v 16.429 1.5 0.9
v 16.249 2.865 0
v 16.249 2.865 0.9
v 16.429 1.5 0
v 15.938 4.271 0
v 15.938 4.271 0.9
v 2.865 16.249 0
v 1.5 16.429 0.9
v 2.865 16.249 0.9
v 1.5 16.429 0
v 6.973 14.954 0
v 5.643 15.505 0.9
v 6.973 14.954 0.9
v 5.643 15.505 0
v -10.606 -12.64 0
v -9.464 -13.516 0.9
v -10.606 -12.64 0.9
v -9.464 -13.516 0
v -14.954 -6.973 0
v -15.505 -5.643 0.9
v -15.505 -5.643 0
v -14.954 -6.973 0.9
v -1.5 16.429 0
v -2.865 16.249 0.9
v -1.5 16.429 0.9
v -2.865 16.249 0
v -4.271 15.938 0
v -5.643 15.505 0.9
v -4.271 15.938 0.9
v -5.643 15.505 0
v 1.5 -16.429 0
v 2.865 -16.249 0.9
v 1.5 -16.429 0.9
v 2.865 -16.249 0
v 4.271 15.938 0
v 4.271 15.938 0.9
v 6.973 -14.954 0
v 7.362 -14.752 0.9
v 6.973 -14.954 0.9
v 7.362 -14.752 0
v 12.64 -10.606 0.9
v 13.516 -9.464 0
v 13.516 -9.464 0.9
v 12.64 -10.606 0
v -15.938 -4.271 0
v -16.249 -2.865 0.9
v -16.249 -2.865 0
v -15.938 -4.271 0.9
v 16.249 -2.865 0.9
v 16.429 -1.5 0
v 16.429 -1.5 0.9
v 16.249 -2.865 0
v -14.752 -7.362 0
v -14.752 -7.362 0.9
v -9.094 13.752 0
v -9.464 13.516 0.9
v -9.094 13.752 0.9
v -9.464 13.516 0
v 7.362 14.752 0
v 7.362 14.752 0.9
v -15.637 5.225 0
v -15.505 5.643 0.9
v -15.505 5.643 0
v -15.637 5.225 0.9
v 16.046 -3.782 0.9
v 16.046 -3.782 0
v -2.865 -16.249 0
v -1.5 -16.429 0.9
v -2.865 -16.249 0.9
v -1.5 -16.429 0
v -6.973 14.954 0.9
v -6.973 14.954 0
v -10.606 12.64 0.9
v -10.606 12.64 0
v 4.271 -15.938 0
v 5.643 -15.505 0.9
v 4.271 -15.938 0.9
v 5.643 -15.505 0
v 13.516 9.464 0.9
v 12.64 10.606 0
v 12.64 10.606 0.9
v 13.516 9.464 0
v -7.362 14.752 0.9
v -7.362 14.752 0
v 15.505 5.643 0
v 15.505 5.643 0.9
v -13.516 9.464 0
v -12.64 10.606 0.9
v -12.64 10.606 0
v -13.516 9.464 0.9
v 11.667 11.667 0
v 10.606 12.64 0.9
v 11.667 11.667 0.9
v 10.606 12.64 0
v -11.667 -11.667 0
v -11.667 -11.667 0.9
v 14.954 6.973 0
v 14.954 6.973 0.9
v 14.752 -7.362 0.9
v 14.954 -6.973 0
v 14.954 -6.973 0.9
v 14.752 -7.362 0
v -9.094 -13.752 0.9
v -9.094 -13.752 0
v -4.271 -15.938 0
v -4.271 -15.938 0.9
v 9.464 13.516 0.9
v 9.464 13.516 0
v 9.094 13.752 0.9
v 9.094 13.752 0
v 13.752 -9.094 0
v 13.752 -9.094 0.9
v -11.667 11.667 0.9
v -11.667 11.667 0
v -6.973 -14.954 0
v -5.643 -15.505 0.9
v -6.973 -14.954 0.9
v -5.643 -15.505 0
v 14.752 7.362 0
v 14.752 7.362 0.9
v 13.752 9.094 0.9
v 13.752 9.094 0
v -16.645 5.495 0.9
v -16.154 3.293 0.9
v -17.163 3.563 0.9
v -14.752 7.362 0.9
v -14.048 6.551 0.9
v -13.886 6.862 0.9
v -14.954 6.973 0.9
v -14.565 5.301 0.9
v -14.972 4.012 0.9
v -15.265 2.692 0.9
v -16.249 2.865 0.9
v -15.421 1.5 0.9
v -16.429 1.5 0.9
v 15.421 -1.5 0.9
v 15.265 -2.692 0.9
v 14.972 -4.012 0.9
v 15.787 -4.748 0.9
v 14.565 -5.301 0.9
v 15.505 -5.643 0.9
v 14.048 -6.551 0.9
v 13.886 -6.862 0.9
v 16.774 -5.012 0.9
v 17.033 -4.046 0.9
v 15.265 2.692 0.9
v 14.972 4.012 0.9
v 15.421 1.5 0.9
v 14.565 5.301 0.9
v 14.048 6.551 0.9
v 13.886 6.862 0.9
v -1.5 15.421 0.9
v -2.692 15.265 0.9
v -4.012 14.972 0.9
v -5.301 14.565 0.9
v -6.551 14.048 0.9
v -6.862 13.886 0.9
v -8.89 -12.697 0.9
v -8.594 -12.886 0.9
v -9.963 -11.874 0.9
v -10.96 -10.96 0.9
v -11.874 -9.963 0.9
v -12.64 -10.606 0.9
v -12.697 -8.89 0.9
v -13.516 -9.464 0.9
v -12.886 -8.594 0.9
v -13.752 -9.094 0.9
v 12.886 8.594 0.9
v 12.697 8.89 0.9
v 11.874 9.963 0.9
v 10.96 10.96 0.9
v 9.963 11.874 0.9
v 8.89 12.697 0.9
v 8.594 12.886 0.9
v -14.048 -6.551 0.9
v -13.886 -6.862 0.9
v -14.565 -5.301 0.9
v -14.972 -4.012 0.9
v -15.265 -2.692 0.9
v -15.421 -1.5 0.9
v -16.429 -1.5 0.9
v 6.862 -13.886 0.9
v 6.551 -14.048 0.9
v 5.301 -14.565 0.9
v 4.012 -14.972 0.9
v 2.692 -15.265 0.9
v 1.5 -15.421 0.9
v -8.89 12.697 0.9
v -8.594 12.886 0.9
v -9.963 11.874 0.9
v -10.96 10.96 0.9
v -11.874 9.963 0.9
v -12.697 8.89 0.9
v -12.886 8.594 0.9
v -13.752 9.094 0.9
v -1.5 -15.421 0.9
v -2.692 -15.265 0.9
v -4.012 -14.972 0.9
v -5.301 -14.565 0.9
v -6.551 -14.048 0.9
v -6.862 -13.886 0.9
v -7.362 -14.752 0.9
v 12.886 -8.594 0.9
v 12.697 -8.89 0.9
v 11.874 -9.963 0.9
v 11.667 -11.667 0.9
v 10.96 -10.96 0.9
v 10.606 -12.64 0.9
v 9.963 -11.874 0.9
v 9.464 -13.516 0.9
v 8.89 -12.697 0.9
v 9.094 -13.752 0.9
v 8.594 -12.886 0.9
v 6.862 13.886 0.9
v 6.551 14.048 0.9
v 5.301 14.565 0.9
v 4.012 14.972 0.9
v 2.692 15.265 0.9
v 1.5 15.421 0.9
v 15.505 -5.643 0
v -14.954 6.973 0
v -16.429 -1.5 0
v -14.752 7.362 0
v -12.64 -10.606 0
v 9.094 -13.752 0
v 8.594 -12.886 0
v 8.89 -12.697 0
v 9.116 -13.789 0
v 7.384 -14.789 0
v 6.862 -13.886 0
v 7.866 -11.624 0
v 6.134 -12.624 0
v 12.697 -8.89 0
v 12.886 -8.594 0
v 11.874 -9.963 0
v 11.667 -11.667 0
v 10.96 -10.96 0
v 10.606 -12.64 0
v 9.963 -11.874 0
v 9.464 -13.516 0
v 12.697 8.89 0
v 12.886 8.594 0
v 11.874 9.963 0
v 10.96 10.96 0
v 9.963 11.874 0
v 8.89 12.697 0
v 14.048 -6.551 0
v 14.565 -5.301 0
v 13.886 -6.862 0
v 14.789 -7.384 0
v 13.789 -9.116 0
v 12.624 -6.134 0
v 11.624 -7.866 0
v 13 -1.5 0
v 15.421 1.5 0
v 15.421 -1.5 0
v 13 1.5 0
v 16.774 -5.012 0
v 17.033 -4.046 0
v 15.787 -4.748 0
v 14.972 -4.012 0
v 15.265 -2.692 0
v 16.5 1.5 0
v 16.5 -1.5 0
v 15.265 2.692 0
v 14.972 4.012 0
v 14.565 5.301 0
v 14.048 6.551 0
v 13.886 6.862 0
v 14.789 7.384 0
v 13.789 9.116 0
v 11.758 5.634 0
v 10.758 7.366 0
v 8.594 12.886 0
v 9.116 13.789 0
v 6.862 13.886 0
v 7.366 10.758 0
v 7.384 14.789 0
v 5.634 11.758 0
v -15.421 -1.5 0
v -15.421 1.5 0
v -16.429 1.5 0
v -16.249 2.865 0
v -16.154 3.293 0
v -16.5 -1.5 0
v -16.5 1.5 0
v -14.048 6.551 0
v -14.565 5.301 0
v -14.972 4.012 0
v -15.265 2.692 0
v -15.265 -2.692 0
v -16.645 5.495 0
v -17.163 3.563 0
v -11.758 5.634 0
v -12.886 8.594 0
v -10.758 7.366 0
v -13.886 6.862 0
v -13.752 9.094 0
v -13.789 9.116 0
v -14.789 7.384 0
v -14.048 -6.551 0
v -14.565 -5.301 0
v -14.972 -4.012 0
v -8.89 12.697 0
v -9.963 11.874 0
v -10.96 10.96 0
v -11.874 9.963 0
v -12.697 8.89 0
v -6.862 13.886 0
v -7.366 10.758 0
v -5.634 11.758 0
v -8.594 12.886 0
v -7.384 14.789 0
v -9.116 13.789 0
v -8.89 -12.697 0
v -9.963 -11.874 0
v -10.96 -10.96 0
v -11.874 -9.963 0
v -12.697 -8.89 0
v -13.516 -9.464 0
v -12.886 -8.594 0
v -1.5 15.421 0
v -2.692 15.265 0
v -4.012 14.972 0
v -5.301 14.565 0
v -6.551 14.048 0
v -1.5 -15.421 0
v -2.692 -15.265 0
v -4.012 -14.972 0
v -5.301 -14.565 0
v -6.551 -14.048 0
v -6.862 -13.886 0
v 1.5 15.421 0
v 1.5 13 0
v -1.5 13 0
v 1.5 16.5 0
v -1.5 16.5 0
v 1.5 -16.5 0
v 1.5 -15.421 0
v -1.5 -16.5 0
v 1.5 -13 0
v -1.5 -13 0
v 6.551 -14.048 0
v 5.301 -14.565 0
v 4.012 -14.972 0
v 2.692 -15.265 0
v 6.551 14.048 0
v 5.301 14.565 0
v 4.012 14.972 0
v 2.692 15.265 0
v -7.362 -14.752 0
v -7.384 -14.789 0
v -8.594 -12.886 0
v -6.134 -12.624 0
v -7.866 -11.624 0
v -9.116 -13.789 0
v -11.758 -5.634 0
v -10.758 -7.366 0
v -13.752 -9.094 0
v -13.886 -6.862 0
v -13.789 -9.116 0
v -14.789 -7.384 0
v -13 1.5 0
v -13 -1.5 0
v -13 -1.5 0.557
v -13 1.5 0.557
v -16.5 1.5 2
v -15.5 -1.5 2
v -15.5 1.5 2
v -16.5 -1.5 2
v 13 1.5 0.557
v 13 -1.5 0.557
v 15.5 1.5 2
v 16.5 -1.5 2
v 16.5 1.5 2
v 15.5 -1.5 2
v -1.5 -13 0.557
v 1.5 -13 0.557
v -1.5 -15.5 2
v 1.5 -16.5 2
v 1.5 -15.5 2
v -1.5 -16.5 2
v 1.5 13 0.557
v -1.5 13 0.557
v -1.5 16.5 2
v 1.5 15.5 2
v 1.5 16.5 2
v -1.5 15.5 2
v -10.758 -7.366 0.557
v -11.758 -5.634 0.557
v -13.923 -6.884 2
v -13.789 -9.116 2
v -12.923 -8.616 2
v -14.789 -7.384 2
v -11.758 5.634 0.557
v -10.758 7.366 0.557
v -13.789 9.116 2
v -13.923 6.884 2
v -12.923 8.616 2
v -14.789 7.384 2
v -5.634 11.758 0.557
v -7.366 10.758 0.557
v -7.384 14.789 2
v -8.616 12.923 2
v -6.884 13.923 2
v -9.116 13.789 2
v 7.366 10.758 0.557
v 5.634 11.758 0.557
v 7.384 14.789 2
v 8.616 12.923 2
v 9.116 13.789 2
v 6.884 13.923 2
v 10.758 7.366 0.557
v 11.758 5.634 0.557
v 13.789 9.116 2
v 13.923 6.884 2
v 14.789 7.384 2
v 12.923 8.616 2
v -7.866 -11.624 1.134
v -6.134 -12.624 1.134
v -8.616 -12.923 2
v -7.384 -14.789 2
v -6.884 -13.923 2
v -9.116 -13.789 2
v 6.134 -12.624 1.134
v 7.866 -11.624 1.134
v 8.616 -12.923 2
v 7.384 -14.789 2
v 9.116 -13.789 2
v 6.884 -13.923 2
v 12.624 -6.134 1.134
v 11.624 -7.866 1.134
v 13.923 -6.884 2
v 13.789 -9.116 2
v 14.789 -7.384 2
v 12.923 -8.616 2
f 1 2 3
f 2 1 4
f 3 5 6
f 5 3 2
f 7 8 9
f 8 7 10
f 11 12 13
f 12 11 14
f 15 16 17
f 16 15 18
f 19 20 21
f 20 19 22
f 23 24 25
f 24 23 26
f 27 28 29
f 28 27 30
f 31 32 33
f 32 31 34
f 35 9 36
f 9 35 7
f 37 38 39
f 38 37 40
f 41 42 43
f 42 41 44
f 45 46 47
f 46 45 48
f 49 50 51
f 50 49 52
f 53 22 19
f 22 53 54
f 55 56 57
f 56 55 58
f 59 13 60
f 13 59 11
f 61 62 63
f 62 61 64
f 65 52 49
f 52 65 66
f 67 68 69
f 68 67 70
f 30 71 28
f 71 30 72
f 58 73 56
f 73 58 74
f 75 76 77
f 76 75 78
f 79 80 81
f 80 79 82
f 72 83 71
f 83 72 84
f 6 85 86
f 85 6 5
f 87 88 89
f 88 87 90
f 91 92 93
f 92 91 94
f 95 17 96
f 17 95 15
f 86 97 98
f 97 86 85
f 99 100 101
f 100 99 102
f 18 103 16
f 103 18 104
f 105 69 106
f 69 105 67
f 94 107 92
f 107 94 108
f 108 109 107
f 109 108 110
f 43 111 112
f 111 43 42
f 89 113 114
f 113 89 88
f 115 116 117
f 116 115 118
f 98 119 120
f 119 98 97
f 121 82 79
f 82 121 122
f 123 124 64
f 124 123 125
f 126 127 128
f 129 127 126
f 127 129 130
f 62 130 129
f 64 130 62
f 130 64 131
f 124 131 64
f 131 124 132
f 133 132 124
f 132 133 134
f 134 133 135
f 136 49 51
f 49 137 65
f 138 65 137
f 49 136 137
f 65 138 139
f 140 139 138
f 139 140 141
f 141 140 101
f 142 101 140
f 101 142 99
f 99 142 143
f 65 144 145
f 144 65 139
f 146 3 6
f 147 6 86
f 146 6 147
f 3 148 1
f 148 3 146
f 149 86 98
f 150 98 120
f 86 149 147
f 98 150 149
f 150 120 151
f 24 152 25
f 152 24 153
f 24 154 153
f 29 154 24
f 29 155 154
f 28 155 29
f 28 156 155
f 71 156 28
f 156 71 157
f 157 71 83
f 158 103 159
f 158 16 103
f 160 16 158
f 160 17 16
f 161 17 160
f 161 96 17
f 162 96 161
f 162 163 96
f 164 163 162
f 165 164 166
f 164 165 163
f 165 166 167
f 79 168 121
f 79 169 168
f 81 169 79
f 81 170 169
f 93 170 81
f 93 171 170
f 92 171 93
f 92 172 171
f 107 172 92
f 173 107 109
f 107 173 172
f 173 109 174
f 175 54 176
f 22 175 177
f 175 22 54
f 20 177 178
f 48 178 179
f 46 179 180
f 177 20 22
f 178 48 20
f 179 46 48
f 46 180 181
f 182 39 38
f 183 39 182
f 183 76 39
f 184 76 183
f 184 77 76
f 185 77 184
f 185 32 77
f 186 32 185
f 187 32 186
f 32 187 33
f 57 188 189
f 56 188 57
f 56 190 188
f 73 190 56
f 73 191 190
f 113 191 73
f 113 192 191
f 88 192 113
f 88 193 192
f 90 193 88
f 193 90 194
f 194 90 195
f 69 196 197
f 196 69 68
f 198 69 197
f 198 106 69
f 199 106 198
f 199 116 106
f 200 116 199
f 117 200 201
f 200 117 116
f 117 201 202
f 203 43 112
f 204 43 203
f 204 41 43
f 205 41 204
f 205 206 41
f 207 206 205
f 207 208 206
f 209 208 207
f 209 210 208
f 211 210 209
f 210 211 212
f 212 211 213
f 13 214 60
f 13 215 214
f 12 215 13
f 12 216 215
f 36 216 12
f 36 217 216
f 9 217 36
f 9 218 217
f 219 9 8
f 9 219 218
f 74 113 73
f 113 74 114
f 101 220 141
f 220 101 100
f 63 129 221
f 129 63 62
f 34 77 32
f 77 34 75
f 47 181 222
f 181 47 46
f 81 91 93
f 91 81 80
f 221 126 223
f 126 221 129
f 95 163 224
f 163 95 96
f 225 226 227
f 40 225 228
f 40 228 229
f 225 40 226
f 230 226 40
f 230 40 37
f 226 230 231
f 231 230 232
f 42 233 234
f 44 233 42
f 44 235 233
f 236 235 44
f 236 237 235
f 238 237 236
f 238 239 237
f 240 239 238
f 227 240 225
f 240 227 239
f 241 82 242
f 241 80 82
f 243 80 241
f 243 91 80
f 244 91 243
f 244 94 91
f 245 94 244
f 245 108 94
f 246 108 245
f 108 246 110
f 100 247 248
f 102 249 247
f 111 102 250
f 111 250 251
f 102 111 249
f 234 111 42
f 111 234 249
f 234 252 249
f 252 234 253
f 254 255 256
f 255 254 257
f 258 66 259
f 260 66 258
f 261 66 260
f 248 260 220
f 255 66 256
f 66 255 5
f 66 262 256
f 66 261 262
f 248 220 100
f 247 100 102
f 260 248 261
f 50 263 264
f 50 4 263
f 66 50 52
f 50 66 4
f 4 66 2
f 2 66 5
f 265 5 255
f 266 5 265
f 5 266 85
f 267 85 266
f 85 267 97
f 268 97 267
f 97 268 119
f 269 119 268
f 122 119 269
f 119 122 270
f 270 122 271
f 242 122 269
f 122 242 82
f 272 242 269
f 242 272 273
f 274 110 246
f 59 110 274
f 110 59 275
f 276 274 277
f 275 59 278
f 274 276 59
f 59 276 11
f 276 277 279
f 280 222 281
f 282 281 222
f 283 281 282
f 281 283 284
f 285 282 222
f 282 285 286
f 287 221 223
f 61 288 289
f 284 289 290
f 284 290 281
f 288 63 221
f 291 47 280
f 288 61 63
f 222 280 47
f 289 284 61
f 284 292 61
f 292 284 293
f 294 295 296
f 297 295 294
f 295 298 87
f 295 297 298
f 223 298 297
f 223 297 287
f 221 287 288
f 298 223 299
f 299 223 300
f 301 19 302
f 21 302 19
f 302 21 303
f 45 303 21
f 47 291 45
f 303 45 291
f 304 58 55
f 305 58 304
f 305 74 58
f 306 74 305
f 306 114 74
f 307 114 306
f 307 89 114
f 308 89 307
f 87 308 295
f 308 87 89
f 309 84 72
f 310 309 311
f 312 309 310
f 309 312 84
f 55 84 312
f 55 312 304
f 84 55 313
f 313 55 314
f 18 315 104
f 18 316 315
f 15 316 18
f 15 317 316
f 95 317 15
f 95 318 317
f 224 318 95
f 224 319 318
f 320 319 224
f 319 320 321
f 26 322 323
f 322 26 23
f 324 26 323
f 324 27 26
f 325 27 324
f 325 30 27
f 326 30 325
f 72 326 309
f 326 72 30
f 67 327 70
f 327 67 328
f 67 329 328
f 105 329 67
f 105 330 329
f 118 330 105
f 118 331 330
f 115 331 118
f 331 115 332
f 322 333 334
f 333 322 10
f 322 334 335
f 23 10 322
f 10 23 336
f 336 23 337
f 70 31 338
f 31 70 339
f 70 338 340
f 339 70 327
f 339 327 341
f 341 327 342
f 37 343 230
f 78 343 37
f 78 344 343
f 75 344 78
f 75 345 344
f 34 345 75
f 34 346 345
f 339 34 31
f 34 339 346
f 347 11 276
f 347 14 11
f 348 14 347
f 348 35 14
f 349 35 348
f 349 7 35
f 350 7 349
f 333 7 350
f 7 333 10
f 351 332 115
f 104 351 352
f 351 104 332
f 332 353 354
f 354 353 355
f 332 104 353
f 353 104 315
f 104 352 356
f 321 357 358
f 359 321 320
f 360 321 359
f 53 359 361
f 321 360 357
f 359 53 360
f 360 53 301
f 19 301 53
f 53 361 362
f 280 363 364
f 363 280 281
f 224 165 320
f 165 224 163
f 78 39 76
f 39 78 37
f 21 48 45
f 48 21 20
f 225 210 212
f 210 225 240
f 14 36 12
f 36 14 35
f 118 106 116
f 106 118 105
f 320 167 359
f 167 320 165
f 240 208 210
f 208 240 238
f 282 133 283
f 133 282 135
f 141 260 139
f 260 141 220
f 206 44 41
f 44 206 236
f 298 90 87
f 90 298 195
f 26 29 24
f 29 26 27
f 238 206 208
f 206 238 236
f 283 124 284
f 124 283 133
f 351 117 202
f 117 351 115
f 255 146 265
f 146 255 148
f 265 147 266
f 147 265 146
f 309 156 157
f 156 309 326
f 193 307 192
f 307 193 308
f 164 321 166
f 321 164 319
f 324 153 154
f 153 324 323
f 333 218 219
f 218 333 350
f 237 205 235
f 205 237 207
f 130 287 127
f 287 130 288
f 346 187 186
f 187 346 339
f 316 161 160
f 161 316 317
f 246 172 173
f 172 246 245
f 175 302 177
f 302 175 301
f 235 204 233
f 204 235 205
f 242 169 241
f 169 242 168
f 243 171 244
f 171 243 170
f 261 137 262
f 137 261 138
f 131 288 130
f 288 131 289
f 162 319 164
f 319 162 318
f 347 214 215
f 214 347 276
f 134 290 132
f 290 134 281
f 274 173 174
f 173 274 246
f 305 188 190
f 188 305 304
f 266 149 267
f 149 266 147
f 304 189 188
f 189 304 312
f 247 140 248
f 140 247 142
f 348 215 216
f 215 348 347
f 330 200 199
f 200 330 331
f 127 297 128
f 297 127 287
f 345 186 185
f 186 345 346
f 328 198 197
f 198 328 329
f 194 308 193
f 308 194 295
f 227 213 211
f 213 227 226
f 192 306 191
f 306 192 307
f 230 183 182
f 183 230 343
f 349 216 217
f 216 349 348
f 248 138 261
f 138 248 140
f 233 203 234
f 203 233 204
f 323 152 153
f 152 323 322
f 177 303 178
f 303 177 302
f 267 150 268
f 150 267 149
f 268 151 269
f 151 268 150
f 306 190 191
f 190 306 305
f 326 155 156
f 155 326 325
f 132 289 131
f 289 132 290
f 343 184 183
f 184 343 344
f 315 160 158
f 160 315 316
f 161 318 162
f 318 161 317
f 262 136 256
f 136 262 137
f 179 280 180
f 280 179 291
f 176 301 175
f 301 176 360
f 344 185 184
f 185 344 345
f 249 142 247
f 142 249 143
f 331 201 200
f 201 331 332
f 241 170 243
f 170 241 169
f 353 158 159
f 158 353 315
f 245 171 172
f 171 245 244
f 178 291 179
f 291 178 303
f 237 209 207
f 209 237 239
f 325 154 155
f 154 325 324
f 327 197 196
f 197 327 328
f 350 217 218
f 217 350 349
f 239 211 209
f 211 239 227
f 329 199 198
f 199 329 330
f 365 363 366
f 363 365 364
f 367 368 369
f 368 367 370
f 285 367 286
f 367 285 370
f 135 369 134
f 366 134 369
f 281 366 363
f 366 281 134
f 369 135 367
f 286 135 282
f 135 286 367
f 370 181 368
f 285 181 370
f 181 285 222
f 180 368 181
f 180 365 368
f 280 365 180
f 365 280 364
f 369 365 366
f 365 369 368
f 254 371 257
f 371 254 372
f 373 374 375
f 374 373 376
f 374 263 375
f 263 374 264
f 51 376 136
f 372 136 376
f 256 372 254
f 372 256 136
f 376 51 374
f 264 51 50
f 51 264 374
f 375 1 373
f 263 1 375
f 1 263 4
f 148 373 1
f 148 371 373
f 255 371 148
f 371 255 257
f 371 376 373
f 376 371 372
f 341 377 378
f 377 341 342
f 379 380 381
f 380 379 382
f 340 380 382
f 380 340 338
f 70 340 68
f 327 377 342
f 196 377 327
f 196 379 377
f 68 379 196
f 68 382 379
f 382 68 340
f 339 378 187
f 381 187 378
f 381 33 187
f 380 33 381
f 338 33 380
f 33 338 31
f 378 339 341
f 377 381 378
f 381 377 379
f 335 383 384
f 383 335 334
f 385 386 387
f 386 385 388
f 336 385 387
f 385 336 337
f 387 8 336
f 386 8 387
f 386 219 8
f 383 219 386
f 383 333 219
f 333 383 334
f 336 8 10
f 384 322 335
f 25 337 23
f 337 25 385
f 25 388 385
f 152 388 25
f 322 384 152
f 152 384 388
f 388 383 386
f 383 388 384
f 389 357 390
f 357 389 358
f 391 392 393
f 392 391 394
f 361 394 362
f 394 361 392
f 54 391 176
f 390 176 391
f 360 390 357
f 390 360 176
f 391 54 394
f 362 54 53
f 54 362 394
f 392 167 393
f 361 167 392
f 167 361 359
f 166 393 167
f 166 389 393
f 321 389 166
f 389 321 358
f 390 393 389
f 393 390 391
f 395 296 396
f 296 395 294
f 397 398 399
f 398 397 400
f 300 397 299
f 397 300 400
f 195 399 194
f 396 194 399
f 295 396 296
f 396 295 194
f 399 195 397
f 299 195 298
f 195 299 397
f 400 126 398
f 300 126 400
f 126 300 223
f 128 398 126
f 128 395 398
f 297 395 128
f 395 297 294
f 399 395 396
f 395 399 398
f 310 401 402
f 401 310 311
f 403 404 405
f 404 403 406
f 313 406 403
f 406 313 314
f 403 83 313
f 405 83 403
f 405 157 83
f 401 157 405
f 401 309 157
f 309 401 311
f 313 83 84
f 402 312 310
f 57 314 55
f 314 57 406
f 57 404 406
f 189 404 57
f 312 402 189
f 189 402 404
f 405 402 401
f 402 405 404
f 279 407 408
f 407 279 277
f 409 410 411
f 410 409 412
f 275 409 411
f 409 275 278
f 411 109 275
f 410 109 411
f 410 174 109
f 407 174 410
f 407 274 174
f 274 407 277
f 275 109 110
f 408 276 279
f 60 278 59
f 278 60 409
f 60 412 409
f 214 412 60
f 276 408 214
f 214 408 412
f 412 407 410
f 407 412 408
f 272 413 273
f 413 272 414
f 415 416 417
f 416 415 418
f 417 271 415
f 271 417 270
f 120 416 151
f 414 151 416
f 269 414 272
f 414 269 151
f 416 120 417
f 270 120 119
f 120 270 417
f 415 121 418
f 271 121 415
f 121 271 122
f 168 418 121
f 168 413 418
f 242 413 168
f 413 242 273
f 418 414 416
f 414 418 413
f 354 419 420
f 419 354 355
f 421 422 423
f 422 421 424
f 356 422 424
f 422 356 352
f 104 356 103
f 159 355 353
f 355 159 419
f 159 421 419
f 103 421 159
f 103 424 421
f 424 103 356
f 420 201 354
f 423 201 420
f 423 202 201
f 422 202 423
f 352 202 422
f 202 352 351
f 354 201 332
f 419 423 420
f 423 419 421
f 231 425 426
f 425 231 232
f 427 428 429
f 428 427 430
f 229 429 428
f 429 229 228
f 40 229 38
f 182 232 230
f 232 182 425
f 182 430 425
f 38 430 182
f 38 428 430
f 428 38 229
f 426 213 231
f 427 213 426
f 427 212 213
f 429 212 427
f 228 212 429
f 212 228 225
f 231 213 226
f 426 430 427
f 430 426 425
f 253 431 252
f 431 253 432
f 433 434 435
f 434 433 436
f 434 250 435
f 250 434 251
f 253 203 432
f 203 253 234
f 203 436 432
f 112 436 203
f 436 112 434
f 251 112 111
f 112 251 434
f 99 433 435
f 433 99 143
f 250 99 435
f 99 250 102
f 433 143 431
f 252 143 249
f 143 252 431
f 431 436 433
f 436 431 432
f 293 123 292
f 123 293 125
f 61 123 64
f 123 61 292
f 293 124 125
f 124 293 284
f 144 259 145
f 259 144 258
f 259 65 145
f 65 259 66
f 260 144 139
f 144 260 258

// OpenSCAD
// GShock GBA 800 chapter ring

od = 33;
id = 31;
ring_h = 0.9;

module main_ring() {
    $fn=72;
    difference() {
        cylinder(h=ring_h, d=od);
        cylinder(h=ring_h, d=id);
    }
}

module idx(width, length, rot) {
    idx_h = 2;
    rotate([0, 0, rot]) translate([-0.5*od, -0.5*width, 0]) {
        difference() {
          cube([length, width, idx_h]);
          translate([1, 0, 2]) rotate([0, 30, 0]) cube([10, width, idx_h]);
        }
    }
}
module notches() {
    rot = 15;
    nl_w = 2;
    nl_s = 1;
    rotate([0, 0, -15]) translate([-0.5*od-1, -0.5*nl_w, 0]) cube([1.5, nl_w, ring_h]);
    rotate([0, 0, -195]) translate([-0.5*od-1, -0.5*nl_s, 0]) cube([1.5, nl_s, ring_h]);
}

main_ring();
idx(3, 3.5, 0);
idx(3, 3.5, 180);

idx(3, 3.5, 90);
idx(3, 3.5, 270);

idx(2, 3.5, 30);
idx(2, 3.5, -30);
idx(2, 3.5, -60);
idx(2, 3.5, -120);
idx(2, 3.5, -150);

idx(2, 2.5, 60);
idx(2, 2.5, 120);
idx(2, 2.5, 150);

notches();
